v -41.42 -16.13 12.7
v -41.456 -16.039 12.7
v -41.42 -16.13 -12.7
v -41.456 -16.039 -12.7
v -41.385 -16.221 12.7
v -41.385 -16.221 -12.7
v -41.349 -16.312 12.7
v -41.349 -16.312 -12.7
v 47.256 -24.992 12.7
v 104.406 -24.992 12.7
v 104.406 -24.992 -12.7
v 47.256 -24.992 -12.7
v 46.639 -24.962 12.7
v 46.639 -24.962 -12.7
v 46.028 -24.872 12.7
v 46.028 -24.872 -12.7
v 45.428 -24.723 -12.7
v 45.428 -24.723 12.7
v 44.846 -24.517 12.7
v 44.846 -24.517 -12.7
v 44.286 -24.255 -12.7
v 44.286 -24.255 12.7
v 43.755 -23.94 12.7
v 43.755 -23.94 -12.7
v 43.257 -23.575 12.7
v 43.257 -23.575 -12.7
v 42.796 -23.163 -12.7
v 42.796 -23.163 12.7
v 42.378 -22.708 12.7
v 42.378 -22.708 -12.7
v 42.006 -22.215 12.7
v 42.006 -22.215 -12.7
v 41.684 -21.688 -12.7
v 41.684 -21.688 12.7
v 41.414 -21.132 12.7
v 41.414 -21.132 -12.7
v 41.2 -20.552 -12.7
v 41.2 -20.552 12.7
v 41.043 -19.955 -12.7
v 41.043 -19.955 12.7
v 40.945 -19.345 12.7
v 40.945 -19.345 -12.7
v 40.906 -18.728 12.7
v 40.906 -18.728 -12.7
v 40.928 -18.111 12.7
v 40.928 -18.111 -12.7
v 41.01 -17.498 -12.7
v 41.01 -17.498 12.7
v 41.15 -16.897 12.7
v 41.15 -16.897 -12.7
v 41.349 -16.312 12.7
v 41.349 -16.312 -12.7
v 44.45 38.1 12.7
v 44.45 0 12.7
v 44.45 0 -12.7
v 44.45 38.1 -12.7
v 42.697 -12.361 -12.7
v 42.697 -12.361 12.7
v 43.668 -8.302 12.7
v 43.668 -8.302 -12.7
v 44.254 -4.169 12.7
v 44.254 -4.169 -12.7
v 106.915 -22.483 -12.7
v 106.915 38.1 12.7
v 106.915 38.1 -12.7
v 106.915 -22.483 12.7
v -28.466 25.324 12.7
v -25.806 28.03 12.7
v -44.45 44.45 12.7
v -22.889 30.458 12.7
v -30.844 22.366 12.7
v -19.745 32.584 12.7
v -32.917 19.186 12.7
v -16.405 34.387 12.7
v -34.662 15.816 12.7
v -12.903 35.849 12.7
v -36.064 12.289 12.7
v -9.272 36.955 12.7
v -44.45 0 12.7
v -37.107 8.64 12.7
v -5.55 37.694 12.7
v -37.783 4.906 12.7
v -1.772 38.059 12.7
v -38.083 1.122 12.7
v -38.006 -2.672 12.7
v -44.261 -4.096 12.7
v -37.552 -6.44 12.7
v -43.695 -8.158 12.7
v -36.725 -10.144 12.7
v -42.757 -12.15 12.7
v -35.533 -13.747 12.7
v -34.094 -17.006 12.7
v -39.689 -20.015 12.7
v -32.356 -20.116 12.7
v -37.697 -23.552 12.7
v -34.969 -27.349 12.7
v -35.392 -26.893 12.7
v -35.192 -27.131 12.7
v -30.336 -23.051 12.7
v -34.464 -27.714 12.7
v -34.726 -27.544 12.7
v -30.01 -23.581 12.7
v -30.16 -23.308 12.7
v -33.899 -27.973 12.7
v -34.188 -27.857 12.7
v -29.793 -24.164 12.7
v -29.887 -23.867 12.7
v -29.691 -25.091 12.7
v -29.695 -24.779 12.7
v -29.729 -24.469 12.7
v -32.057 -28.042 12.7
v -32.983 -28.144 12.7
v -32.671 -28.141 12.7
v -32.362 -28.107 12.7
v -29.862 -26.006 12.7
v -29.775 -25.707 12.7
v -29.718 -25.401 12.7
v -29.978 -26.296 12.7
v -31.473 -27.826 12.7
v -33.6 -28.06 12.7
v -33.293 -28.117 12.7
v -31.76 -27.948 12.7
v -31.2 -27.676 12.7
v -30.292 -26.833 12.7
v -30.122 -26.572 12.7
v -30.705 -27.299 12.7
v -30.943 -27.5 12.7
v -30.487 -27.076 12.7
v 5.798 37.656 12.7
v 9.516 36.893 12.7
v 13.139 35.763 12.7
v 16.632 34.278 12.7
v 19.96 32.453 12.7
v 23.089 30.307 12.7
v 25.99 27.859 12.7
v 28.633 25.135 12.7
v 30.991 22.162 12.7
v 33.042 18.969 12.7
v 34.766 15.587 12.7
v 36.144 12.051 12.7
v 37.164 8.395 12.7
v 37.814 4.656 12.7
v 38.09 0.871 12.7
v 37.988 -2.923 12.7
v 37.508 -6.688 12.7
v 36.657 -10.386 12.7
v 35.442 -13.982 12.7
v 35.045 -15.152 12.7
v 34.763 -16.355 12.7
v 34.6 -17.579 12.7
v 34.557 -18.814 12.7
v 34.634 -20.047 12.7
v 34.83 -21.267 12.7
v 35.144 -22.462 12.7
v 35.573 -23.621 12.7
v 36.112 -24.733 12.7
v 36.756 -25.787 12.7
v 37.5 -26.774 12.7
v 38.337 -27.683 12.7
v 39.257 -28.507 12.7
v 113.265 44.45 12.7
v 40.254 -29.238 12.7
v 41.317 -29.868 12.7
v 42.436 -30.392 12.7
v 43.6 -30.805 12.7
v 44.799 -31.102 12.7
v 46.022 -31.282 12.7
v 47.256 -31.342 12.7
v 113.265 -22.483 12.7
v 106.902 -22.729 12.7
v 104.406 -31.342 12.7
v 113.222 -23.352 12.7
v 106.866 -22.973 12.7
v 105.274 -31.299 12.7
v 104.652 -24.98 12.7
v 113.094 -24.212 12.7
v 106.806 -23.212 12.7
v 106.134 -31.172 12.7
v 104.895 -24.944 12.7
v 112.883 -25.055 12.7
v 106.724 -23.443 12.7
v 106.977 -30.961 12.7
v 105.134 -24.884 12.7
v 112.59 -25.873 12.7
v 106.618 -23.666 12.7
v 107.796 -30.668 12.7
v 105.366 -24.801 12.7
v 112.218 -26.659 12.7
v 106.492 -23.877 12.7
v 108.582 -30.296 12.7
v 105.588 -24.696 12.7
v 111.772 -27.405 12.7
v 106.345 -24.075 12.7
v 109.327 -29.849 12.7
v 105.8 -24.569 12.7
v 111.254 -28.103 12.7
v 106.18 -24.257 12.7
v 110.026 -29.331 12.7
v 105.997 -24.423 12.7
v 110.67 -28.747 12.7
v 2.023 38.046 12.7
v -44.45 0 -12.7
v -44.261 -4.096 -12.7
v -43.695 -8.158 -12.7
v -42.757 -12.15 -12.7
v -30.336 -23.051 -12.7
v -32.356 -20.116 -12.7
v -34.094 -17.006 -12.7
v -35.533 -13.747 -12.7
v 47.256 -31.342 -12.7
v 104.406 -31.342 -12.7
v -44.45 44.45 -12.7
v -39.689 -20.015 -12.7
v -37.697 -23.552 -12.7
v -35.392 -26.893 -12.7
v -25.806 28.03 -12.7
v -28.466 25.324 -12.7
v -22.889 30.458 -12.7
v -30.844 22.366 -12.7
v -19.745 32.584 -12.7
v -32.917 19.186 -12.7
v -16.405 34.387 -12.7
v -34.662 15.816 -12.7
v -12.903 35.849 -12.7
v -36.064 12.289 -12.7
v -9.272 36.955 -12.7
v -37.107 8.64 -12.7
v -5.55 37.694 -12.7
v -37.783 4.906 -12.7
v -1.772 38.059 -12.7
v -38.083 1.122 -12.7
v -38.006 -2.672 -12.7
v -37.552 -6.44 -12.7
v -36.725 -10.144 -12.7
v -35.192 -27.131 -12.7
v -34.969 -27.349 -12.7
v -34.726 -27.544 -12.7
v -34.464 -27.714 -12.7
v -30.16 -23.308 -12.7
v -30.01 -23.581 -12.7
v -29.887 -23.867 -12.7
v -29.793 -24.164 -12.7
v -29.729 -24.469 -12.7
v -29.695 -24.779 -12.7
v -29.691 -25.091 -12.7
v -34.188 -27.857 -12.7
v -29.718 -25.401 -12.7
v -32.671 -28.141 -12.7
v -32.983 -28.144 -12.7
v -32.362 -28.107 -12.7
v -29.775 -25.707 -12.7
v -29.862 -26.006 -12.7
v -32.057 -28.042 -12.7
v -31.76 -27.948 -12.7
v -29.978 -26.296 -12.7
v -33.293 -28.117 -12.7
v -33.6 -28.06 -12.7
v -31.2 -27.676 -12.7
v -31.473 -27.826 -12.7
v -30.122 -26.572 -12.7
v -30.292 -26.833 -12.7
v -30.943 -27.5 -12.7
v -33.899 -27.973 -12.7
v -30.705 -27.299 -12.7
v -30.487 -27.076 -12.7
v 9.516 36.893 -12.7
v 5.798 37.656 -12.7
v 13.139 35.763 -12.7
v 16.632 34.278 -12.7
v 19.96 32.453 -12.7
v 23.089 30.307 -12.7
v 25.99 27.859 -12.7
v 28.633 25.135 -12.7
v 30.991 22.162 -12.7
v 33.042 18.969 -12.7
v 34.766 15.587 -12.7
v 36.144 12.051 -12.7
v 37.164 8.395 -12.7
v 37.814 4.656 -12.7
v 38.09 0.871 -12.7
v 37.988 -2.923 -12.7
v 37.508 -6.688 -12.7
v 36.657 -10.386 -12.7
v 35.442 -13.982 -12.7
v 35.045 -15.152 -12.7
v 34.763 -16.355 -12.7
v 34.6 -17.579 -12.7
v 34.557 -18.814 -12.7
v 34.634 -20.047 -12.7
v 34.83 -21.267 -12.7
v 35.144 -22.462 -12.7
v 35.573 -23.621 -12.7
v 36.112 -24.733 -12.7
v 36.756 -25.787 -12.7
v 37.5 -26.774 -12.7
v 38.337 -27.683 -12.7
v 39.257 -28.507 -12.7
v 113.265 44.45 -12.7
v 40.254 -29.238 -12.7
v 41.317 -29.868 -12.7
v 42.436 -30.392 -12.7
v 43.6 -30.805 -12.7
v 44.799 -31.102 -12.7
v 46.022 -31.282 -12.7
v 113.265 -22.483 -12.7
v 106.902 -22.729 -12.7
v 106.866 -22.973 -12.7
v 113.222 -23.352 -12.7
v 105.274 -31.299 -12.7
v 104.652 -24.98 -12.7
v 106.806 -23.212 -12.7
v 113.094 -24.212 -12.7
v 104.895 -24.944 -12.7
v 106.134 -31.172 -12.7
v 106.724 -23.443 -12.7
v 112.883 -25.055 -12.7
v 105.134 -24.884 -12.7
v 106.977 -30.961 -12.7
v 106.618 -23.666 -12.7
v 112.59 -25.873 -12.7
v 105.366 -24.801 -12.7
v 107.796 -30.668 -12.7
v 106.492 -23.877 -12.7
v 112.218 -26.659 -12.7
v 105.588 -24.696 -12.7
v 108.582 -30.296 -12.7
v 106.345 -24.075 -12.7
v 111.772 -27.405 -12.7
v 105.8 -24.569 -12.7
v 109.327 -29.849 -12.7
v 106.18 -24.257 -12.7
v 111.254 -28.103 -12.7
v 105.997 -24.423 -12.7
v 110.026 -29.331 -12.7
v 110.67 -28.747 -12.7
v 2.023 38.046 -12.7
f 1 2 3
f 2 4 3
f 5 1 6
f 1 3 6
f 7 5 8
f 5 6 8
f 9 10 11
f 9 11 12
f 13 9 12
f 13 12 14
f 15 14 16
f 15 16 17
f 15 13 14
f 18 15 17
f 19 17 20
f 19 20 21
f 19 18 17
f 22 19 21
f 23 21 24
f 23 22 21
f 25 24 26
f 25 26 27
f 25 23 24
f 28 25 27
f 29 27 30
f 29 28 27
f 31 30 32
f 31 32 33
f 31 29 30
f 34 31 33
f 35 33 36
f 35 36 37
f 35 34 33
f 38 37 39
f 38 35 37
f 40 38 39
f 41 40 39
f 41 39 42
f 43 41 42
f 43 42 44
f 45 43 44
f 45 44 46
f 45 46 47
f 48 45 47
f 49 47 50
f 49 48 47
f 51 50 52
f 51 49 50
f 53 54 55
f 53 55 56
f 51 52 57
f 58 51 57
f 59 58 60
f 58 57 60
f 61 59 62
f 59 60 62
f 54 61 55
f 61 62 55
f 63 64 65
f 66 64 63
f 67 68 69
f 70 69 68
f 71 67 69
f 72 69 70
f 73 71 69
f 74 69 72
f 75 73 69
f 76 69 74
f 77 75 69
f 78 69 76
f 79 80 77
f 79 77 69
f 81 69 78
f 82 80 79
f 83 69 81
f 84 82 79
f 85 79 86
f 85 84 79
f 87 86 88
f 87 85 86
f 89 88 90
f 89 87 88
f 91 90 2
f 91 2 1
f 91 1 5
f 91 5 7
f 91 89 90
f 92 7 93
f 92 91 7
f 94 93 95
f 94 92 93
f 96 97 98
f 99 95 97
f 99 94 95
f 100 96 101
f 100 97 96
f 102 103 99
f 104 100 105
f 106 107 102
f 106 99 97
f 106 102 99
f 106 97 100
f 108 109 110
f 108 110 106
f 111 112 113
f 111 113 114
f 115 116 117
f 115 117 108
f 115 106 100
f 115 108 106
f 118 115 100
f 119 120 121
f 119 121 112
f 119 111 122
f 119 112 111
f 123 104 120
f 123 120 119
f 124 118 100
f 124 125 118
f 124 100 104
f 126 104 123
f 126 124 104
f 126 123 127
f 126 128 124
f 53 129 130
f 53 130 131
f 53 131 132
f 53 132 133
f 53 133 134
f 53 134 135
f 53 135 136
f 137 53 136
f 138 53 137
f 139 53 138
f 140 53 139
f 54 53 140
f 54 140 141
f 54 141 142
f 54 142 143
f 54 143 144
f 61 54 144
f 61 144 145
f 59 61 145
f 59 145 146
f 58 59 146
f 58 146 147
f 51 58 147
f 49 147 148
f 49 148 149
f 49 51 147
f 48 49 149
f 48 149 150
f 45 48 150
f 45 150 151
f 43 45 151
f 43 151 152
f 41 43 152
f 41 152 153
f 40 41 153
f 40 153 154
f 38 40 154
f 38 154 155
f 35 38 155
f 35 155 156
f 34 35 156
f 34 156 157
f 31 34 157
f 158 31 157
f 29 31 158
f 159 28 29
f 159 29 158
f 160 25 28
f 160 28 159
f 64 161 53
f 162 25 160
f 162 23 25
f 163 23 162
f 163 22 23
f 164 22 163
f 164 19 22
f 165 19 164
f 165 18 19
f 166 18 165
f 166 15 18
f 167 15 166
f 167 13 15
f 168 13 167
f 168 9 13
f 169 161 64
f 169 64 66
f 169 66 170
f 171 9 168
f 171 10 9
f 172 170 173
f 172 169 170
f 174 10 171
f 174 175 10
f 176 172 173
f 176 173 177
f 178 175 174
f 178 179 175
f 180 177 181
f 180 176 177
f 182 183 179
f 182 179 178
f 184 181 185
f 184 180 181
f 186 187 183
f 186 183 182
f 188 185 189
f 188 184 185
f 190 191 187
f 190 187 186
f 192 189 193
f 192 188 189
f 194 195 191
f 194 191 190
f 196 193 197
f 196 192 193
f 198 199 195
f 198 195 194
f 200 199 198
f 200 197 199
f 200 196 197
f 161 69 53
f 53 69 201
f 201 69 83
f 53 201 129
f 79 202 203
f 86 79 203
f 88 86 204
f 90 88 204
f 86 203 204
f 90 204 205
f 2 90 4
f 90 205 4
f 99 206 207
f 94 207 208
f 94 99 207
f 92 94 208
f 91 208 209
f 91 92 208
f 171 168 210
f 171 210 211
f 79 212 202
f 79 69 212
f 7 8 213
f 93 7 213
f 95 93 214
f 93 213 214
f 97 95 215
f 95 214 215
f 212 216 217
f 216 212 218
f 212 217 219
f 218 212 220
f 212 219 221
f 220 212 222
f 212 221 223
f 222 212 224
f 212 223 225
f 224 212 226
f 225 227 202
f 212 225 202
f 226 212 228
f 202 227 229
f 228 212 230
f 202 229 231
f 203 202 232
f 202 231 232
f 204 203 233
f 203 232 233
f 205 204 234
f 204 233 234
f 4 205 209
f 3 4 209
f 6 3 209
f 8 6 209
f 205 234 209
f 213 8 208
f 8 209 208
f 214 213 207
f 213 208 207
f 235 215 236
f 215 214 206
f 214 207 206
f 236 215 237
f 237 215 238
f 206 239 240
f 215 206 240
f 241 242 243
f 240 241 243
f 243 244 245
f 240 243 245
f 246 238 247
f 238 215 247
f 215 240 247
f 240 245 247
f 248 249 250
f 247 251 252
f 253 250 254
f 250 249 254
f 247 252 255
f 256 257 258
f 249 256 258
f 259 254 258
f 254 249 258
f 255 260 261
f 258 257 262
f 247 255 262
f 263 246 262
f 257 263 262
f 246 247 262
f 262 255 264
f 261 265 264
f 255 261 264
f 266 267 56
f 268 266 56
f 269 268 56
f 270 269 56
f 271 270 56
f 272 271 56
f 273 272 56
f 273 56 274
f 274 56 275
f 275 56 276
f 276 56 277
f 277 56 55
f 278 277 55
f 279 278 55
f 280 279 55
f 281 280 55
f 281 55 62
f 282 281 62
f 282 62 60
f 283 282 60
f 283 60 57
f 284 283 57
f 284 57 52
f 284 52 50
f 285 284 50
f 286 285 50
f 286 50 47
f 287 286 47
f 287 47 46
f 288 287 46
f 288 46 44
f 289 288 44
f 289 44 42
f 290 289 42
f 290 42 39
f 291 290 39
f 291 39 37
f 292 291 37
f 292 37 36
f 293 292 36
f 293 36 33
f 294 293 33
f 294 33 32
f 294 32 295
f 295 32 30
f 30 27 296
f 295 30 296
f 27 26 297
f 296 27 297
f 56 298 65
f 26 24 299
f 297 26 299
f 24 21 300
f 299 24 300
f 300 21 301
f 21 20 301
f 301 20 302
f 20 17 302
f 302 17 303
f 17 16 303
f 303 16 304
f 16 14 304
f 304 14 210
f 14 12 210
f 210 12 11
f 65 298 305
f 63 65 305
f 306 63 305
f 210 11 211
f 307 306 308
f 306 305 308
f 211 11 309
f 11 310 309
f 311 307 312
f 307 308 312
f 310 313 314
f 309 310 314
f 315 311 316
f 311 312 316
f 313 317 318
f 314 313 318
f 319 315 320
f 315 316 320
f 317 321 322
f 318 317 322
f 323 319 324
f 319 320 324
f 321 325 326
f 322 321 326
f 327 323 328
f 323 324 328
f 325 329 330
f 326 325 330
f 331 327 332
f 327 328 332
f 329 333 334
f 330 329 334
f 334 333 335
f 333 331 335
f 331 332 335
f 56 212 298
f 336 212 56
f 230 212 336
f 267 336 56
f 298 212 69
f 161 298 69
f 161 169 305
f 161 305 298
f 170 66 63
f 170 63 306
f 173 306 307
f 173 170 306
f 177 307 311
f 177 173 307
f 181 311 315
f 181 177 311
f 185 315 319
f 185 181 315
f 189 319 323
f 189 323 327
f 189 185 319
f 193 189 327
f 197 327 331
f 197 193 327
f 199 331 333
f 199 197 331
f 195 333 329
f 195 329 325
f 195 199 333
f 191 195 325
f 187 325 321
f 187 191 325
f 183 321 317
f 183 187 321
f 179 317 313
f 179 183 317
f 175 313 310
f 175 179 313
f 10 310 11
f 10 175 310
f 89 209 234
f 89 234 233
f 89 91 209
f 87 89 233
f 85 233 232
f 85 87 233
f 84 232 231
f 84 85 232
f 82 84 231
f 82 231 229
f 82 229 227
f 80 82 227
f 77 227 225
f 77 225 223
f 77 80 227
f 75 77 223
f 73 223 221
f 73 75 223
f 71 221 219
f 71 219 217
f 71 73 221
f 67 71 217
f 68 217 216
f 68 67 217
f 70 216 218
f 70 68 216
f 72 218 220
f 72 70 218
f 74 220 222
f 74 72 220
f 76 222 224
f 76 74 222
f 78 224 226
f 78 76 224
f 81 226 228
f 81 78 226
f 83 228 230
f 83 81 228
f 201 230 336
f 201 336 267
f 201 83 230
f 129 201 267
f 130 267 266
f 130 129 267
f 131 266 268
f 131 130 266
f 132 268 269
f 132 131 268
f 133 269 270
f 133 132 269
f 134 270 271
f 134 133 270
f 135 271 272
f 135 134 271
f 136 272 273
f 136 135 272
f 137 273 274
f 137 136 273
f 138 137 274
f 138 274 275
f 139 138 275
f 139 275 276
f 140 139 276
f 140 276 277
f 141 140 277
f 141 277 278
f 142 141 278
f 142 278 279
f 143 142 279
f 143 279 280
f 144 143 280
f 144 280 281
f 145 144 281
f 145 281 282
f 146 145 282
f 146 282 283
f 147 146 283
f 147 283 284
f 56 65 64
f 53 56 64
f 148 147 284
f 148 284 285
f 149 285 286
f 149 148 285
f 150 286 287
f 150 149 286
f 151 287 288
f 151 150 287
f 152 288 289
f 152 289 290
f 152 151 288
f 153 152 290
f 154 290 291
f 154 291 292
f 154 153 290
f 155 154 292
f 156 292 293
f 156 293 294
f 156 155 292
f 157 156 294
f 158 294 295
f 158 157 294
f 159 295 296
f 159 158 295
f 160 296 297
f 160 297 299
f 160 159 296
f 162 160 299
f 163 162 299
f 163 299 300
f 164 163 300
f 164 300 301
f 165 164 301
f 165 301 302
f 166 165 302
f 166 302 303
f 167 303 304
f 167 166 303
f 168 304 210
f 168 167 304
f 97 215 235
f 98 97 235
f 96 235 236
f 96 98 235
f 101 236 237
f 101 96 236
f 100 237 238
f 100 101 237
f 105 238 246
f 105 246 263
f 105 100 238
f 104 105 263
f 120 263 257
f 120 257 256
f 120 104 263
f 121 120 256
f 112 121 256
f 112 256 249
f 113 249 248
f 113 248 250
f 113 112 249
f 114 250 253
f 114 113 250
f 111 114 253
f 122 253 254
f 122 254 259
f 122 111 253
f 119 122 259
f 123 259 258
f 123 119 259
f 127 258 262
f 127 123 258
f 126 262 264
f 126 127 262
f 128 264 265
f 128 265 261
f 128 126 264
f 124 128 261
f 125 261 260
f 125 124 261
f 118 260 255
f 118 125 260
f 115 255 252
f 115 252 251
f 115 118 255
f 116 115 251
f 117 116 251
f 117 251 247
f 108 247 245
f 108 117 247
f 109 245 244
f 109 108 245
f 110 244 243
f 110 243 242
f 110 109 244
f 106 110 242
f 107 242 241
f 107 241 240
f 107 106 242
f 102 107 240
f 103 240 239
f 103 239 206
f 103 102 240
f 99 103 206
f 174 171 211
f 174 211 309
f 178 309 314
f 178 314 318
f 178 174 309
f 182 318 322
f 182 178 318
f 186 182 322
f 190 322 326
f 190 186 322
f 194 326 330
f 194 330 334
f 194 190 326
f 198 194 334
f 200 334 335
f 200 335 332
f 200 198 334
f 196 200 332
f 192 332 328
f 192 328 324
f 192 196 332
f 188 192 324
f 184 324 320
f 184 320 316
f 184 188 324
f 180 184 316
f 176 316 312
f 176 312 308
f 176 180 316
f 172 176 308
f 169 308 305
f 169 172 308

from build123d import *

# Parameters (mm, degrees)
F1_DEPTH = 12.7
F2_DEPTH = 12.7
F3_DEPTH = 12.7
F4_W     = 6.35
F4_H     = 25.4
F5_DEPTH = 62.464519896


# Not quite as in the source:
# - a feature names something its author has since deleted; it is built from what else it names


with BuildPart() as f1:
    # F0 (on Top) → F1 (new body, symmetric)
    with BuildSketch(Plane.XY):
        with BuildLine():
            ThreePointArc((-35.5333842184, -13.7473126824), (0.1257546156, 38.0997924637), (35.4418604651, -13.9815781216))
            ThreePointArc((35.4418604651, -13.9815781216), (36.7563215678, -25.7870785948), (47.2558139535, -31.3421041622))
            Line((47.2558139535, -31.3421041622), (104.4058139535, -31.3421041622))
            ThreePointArc((104.4058139535, -31.3421041622), (110.669864998, -28.7474492641), (113.264519896, -22.4833982196))
            Line((113.264519896, -22.4833982196), (113.264519896, 44.45))
            Line((113.264519896, 44.45), (106.914519896, 44.45))
            Line((106.914519896, 44.45), (106.914519896, -22.4833982196))
            ThreePointArc((106.914519896, -22.4833982196), (106.1797369375, -24.2573212036), (104.4058139535, -24.9921041622))
            Line((104.4058139535, -24.9921041622), (47.2558139535, -24.9921041622))
            ThreePointArc((47.2558139535, -24.9921041622), (42.0060677606, -22.2145913785), (41.3488372093, -16.3118411419))
            ThreePointArc((41.3488372093, -16.3118411419), (43.6678274818, -8.3020083729), (44.45, 0))
            ThreePointArc((44.45, 0), (31.4308965011, 31.4308963464), (2.188e-07, 44.45))
            ThreePointArc((2.188e-07, 44.45), (-31.4308963464, 31.4308965011), (-44.45, 0))
            ThreePointArc((-44.45, 0), (-43.6949916081, -8.157831107), (-41.4556149214, -16.0385314629))
            ThreePointArc((-41.4556149214, -16.0385314629), (-41.4024515906, -16.1752744115), (-41.3488372093, -16.3118411419))
            ThreePointArc((-41.3488372093, -16.3118411419), (-38.7334132864, -21.806540193), (-35.3920150029, -26.8925226418))
            ThreePointArc((-35.3920150029, -26.8925226418), (-30.9431194568, -27.499629239), (-30.3360128596, -23.0507336929))
            ThreePointArc((-30.3360128596, -23.0507336929), (-33.2615811181, -18.581636675), (-35.5333842184, -13.7473126825))
        make_face()
    extrude(amount=F1_DEPTH, both=True)

    # F0 (on Top) → F2 (join, symmetric)
    with BuildSketch(Plane.XY):
        with BuildLine():
            Line((44.45, 0), (44.45, 44.45))
            Line((44.45, 44.45), (2.188e-07, 44.45))
            ThreePointArc((2.188e-07, 44.45), (31.4308965011, 31.4308963464), (44.45, 0))
        make_face()
    extrude(amount=F2_DEPTH, both=True)

    # F0 (on Top) → F3 (join, symmetric)
    with BuildSketch(Plane.XY):
        with BuildLine():
            Line((-44.45, 44.45), (-44.45, 0))
            ThreePointArc((-44.45, 0), (-31.4308963464, 31.4308965011), (2.188e-07, 44.45))
            Line((2.188e-07, 44.45), (-44.45, 44.45))
        make_face()
    extrude(amount=F3_DEPTH, both=True)

    # F4 (on face) → F5 (join, through all)
    with BuildSketch(Plane(origin=(106.914519896, 0, 0), x_dir=(0, -1, 0), z_dir=(-1, 0, 0))):
        with Locations((-41.275, 0)):
            Rectangle(F4_W, F4_H)
    extrude(amount=F5_DEPTH)


solid = f1.part
